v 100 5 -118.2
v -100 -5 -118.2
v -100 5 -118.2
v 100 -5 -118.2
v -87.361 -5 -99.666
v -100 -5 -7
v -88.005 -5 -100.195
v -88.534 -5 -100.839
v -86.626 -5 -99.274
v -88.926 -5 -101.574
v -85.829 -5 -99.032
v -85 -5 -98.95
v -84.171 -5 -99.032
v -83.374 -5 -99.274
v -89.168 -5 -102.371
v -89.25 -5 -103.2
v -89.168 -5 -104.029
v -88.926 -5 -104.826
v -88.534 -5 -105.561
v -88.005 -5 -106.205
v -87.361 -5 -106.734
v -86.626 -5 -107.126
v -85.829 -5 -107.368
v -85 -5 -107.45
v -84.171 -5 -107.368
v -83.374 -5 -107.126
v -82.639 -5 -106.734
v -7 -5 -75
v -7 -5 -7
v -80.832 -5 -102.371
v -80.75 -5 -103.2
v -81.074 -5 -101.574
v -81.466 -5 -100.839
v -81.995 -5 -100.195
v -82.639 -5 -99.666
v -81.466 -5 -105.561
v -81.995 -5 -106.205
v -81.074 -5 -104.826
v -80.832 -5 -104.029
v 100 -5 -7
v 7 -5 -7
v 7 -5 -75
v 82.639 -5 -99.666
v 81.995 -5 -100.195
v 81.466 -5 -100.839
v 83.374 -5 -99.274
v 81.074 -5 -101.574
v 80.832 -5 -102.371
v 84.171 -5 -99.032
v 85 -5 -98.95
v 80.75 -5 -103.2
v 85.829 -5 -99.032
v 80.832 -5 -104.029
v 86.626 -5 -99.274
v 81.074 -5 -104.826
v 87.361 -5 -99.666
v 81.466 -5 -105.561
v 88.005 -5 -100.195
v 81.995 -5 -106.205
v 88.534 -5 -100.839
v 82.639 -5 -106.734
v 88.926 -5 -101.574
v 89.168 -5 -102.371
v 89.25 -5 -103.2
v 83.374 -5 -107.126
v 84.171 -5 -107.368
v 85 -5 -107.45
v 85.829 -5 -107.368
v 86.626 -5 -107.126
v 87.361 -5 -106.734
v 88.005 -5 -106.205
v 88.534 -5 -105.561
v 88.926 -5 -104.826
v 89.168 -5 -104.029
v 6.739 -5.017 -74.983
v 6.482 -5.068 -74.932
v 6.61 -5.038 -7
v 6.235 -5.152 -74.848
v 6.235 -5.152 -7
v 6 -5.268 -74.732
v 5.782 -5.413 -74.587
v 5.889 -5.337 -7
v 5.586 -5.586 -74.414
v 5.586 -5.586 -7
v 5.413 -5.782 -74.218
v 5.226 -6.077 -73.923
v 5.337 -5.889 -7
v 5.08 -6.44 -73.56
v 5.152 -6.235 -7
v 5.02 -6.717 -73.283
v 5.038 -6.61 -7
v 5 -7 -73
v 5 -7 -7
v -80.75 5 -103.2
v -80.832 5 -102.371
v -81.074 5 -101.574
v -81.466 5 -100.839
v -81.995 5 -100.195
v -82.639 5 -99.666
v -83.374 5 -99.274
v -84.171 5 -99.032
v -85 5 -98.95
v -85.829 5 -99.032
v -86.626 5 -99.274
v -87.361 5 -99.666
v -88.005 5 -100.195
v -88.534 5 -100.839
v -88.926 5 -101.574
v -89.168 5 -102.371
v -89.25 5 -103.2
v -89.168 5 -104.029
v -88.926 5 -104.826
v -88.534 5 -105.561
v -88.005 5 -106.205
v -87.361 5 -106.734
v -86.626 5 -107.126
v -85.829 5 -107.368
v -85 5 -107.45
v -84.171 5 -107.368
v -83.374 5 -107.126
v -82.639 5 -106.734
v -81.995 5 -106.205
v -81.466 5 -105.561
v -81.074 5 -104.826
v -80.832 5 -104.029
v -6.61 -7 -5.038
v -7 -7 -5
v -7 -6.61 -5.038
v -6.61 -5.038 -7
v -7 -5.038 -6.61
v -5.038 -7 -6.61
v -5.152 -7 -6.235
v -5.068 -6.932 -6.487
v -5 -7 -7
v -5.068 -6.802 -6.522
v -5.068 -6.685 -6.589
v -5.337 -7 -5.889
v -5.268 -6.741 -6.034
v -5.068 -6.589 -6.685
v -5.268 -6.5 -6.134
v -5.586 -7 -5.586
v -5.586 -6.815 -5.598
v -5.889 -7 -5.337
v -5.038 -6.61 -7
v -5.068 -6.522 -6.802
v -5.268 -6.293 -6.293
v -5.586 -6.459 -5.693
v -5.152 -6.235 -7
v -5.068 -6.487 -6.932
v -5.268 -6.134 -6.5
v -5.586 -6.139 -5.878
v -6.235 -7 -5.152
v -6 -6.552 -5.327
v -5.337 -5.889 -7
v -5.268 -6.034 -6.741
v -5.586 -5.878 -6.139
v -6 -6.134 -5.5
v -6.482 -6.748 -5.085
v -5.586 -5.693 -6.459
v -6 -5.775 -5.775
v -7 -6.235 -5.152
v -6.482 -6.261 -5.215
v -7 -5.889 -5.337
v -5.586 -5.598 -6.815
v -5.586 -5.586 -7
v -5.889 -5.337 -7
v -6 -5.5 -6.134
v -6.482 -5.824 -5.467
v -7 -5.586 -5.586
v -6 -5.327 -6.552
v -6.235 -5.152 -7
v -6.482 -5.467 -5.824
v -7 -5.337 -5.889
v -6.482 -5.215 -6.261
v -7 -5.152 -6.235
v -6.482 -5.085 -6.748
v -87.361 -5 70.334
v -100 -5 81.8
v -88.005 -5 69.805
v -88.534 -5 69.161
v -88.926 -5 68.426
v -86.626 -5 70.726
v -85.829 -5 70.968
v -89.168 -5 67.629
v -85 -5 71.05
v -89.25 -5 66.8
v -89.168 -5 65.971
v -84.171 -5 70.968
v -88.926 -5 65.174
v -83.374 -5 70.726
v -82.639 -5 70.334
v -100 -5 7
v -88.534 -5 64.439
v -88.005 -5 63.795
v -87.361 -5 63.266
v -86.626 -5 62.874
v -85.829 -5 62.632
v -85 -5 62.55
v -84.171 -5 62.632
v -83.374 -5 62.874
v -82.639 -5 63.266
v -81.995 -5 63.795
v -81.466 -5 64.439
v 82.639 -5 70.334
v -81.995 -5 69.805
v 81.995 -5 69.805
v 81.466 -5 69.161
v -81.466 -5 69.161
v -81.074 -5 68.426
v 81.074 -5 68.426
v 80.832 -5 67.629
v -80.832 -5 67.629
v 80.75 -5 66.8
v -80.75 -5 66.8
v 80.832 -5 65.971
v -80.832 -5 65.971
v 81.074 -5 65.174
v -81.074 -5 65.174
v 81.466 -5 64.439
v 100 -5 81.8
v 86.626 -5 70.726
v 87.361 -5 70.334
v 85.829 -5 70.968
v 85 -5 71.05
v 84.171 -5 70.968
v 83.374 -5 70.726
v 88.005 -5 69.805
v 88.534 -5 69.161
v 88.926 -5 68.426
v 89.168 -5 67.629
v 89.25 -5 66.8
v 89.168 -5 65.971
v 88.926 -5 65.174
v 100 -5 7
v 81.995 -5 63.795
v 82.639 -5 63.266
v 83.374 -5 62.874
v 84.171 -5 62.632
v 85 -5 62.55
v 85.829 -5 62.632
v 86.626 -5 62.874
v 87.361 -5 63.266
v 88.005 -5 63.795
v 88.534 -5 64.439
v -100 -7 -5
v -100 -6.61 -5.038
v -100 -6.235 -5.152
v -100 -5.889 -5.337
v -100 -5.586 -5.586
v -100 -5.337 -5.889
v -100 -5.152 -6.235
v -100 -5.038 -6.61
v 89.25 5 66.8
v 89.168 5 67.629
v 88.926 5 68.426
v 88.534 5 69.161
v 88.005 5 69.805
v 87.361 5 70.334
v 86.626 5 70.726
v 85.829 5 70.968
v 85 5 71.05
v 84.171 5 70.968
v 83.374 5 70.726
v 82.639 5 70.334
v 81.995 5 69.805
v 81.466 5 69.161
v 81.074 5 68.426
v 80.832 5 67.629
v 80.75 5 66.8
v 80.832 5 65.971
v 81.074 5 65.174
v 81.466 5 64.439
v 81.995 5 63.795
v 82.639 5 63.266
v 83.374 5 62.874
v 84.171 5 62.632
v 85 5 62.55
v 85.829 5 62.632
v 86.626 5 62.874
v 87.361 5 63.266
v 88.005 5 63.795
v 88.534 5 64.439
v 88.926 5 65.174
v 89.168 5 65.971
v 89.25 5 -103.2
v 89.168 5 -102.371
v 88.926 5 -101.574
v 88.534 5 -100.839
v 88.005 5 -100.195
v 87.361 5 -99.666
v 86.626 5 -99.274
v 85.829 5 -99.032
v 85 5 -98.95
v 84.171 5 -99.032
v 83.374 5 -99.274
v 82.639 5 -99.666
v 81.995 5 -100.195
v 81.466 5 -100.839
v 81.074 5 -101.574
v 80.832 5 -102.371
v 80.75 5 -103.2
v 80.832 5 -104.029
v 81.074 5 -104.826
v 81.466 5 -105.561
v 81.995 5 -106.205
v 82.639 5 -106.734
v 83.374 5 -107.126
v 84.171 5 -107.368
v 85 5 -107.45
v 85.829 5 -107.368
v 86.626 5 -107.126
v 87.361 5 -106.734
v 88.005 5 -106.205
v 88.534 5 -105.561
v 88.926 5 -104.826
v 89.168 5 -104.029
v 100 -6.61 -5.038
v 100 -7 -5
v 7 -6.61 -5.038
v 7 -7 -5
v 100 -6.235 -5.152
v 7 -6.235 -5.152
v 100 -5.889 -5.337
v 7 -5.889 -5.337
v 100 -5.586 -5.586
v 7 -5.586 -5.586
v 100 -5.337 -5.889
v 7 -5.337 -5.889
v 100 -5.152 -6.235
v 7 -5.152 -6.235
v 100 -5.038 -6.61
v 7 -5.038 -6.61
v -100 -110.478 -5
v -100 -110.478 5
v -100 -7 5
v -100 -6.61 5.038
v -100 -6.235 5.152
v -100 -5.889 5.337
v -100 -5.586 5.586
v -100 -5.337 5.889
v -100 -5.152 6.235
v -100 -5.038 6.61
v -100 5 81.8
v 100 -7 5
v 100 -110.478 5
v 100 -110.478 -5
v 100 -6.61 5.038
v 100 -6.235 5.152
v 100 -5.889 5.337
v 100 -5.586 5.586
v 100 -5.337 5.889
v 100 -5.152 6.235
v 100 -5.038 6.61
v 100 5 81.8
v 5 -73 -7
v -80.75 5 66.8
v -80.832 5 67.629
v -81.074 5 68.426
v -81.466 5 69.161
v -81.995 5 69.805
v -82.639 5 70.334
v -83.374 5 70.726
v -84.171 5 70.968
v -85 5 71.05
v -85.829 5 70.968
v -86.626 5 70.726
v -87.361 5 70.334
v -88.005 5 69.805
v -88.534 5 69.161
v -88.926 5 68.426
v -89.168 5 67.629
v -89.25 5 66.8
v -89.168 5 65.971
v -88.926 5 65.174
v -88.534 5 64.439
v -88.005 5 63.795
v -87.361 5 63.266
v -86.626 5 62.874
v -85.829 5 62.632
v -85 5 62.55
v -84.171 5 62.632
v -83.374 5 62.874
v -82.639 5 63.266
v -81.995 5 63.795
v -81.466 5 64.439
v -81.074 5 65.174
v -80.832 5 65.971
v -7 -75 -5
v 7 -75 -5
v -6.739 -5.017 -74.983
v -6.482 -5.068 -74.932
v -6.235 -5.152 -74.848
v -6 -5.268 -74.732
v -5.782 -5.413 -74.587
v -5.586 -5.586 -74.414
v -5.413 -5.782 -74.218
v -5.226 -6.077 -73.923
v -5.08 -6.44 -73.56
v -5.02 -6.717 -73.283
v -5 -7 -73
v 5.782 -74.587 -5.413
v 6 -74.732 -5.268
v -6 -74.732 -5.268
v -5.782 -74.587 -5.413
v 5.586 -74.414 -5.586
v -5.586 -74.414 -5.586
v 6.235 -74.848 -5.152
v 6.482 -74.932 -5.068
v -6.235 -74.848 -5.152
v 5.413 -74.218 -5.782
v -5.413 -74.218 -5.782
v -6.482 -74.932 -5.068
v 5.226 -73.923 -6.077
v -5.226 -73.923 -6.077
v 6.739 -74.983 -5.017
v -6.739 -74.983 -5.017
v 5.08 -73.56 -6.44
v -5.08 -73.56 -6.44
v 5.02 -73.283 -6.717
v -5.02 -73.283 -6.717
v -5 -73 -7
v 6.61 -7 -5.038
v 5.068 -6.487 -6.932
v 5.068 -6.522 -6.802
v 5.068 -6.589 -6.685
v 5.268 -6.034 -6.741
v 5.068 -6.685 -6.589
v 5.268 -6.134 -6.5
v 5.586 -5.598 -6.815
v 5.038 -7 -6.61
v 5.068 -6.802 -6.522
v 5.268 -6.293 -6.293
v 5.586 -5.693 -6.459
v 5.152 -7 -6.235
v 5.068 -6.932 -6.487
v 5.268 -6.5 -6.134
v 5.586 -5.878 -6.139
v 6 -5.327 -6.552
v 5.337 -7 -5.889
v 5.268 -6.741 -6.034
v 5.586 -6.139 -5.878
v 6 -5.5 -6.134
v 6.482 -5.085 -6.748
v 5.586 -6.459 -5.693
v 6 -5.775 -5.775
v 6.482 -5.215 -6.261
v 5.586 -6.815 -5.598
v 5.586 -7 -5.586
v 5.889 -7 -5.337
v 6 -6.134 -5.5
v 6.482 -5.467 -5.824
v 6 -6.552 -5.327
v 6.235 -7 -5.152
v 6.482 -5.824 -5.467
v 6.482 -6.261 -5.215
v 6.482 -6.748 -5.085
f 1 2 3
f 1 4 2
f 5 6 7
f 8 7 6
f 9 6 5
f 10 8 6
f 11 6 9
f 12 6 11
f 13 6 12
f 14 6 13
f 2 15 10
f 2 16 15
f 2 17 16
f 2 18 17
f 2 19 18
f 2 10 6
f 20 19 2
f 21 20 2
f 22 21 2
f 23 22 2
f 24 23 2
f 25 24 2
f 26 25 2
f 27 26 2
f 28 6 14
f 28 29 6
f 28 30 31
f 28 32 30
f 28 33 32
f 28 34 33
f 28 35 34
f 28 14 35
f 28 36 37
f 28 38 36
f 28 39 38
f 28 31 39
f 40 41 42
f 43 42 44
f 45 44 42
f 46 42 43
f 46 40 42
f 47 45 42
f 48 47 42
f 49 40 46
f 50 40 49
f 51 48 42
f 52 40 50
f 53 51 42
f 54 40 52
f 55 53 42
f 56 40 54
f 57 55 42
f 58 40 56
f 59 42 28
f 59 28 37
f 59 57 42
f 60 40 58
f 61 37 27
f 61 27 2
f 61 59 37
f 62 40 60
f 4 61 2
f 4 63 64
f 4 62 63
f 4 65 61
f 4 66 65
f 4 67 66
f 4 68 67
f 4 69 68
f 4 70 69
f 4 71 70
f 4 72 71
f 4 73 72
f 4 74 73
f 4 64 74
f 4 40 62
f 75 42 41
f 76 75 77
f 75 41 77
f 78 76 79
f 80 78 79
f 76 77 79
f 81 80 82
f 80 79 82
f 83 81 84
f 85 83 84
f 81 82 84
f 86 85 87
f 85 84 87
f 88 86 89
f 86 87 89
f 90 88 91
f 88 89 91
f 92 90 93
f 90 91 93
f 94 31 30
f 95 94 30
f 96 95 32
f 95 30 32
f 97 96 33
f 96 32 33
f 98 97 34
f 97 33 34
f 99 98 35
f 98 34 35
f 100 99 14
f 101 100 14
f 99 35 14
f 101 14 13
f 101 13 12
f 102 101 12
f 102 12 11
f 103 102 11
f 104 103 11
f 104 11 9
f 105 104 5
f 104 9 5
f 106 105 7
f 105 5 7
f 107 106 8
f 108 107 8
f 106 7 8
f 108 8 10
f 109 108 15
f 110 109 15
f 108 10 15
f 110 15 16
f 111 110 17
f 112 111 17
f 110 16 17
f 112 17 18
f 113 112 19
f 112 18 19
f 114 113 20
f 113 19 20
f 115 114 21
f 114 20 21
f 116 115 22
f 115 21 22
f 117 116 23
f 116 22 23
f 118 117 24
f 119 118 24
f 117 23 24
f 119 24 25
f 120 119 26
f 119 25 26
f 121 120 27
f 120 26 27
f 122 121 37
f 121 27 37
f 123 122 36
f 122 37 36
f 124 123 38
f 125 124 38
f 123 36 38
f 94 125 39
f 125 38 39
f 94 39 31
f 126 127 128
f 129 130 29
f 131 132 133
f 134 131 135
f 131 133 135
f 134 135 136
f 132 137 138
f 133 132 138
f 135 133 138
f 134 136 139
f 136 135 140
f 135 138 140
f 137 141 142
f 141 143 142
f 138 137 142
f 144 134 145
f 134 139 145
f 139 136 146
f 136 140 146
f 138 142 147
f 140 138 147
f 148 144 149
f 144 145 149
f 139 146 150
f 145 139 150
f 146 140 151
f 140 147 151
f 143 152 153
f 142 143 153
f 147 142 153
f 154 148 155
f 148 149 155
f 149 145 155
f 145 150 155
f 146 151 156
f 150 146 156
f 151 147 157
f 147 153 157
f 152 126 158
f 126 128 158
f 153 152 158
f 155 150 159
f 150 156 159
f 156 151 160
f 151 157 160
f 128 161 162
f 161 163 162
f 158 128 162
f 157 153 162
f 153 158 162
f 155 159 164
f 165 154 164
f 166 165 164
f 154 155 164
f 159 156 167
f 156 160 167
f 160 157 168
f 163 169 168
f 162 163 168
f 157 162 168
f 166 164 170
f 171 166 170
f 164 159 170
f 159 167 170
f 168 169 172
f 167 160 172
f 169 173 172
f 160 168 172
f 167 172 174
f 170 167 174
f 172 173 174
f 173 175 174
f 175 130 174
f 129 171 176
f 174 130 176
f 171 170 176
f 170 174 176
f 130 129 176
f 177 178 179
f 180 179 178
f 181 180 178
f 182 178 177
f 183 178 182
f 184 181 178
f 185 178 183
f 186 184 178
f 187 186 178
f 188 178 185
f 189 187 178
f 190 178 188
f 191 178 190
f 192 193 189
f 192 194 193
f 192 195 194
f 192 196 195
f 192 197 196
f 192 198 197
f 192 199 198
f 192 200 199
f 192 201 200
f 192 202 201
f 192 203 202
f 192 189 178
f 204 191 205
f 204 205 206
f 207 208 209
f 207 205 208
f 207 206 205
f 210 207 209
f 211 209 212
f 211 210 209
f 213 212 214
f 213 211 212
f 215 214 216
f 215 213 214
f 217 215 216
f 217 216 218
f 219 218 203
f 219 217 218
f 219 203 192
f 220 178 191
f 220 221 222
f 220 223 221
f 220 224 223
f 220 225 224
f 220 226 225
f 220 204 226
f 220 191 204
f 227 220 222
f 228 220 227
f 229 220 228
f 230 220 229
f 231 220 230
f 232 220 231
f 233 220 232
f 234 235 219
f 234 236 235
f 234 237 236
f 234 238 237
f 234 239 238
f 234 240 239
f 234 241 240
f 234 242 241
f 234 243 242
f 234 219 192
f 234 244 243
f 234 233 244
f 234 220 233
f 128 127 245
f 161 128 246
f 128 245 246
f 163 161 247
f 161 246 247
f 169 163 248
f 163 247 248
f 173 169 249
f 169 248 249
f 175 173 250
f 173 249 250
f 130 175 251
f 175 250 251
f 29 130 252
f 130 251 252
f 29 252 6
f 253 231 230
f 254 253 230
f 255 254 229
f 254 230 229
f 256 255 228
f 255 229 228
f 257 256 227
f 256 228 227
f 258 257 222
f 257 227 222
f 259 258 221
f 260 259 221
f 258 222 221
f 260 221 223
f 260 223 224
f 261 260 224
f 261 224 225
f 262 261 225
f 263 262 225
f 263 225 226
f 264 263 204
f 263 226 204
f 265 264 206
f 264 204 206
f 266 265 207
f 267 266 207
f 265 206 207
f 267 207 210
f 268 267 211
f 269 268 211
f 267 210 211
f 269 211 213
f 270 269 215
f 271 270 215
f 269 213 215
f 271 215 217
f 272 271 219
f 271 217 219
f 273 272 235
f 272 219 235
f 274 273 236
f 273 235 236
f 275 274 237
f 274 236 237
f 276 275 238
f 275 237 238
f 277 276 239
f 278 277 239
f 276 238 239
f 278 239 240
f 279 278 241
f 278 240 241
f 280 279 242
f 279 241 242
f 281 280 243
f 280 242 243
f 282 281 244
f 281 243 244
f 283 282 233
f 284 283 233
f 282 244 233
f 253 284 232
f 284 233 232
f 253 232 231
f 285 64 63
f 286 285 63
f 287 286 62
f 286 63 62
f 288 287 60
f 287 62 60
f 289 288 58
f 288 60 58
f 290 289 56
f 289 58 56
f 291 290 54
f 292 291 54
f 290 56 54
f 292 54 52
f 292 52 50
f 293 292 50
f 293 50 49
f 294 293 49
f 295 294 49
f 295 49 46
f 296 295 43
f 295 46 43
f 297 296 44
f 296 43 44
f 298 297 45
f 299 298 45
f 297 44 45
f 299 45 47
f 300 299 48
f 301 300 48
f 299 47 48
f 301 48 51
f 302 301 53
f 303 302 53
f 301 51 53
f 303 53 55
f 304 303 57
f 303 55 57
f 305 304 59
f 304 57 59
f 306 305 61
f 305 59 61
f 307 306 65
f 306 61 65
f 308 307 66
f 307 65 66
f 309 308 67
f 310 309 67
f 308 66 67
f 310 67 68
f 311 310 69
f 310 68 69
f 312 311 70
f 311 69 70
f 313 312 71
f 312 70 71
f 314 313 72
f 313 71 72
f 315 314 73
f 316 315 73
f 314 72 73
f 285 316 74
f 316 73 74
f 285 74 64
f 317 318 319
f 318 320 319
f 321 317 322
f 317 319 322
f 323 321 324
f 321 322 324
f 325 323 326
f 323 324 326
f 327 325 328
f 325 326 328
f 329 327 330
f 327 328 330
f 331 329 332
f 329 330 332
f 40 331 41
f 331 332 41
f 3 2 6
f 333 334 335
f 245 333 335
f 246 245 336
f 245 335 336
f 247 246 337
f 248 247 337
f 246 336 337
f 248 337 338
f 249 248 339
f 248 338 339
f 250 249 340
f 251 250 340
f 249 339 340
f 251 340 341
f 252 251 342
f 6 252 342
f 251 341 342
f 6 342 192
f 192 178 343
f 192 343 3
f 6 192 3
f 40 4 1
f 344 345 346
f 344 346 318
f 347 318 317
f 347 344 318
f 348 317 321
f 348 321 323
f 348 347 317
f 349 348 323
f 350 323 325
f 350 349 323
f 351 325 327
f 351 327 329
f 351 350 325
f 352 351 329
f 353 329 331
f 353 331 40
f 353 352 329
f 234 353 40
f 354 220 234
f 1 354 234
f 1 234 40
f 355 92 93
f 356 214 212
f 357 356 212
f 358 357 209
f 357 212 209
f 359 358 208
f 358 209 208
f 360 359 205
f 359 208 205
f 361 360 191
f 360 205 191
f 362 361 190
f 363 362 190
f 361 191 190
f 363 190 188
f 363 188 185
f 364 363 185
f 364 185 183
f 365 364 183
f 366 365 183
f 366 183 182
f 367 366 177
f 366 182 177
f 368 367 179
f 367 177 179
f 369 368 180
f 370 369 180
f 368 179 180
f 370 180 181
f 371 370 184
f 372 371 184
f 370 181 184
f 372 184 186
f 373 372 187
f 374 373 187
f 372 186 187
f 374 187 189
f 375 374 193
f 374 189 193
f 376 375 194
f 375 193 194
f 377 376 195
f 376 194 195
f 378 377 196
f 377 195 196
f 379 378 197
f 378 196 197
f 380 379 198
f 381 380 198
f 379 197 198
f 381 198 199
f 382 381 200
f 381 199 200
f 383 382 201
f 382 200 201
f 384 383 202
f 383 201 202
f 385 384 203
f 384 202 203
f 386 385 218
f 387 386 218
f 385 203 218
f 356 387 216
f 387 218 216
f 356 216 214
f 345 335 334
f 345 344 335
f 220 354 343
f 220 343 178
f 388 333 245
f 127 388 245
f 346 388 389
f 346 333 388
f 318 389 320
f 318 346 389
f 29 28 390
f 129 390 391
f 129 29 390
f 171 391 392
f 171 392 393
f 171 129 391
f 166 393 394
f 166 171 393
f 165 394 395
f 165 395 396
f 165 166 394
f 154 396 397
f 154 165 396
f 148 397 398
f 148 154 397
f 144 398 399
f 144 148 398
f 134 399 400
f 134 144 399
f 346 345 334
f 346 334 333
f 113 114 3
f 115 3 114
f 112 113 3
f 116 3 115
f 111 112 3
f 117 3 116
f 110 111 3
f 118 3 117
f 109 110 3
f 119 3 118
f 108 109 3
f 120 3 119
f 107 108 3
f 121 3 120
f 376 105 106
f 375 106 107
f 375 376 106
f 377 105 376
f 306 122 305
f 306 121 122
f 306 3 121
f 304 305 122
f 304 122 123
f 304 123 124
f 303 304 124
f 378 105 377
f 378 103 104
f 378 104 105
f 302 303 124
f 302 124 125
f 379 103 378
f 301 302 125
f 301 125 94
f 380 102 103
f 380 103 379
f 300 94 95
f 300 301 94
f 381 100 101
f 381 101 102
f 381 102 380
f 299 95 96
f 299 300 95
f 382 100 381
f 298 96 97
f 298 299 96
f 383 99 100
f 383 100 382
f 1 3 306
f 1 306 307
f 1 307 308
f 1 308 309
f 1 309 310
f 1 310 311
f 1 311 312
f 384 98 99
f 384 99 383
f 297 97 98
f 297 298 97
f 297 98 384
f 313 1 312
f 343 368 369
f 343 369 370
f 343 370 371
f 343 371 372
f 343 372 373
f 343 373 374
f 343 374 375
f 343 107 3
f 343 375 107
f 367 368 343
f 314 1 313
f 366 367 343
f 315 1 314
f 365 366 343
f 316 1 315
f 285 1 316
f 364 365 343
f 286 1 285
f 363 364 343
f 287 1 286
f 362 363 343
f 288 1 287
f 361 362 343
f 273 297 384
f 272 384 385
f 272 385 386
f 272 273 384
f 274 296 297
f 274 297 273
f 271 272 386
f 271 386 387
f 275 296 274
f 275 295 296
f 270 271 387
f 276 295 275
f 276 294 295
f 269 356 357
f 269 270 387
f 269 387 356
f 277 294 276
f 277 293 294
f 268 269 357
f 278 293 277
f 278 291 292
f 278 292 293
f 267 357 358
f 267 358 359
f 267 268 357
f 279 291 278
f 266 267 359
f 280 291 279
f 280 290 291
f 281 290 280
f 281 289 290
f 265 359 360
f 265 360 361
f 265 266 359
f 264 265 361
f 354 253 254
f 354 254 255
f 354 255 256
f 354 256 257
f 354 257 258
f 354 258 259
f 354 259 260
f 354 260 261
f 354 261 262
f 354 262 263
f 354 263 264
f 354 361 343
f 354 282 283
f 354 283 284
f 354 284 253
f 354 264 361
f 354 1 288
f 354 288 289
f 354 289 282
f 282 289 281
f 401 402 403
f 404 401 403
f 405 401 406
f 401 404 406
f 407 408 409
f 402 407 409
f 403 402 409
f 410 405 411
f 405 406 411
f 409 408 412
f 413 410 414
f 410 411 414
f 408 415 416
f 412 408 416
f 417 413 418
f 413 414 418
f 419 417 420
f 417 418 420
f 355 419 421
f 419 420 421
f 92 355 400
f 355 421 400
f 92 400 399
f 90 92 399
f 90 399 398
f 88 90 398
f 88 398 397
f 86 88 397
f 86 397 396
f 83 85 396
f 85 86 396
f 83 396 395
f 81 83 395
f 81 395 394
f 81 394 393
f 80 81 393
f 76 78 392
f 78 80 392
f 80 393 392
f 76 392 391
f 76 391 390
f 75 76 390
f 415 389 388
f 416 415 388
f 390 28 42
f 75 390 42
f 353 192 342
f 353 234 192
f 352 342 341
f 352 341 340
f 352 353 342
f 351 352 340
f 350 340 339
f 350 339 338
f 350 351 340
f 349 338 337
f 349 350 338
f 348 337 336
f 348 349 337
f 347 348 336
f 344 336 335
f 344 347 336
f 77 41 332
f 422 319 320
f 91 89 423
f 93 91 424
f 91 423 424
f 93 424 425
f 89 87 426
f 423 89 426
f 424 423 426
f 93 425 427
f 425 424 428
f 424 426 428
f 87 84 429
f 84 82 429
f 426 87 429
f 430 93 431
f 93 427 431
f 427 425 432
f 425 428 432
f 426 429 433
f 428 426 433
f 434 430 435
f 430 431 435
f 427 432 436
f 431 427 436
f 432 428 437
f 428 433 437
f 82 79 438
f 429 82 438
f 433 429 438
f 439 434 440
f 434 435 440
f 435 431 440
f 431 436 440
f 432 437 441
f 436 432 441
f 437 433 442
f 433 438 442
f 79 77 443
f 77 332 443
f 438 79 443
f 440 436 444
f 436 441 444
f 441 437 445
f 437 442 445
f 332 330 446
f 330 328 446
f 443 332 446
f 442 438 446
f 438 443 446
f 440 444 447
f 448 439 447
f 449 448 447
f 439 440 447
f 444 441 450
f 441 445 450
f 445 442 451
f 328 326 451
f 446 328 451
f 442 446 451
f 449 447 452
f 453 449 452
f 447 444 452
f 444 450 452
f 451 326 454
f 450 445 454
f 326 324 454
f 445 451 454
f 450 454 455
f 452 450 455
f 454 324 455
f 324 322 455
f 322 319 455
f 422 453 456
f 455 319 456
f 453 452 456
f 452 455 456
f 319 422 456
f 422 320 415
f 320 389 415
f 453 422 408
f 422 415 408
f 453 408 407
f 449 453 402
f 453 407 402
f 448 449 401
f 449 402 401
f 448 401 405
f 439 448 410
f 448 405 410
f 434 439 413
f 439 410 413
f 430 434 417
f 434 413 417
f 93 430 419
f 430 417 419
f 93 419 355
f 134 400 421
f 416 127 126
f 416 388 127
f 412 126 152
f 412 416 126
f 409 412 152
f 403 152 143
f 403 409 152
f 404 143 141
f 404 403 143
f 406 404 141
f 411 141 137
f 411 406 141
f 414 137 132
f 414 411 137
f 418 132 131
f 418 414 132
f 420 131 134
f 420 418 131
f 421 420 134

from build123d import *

# Parameters (mm, degrees)
F1_DEPTH = 100
F2_W     = 10
F2_H     = 70
F3_DEPTH = 70
F5_DEPTH = 10
F6_R     = 4.25
F7_DEPTH = 10
F8_R     = 4.25
F9_DEPTH = 10
F10_R    = 2


with BuildPart() as f1:
    # F0 (on Right) → F1 (new body, symmetric)
    with BuildSketch(Plane.YZ):
        Polygon((5, -118.2), (5, 81.8), (-5, 81.8), (-5, 5), (-110.4780795566, 5), (-110.4780795566, -5), (-5, -5), (-5, -118.2), align=None)
    extrude(amount=F1_DEPTH, both=True)

    # F2 (on face) → F3 (join)
    with BuildSketch(Plane.XZ.offset(5)):
        with Locations((0, -40)):
            Rectangle(F2_W, F2_H)
    extrude(amount=F3_DEPTH)

    # F4 (on face) → F5 (cut)
    with BuildSketch(Plane(origin=(-5, 0, 0), x_dir=(0, -1, 0), z_dir=(-1, 0, 0))):
        Polygon((75, -75), (75, -5), (5, -75), align=None)
    extrude(amount=-F5_DEPTH, mode=Mode.SUBTRACT)

    # F6 (on face) → F7 (cut)
    with BuildSketch(Plane.XZ.offset(5)):
        with Locations((85, -103.2)):
            Circle(F6_R)
        with Locations((-85, -103.2)):
            Circle(F6_R)
    extrude(amount=-F7_DEPTH, mode=Mode.SUBTRACT)

    # F8 (on face) → F9 (cut)
    with BuildSketch(Plane.XZ.offset(5)):
        with Locations((-85, 66.8)):
            Circle(F8_R)
        with Locations((85, 66.8)):
            Circle(F8_R)
    extrude(amount=-F9_DEPTH, mode=Mode.SUBTRACT)

    # F10
    f10_edges = [f1.edges().sort_by_distance(p)[0] for p in [
        (-52.5, -5, -5),
        (52.5, -5, -5),
        (-5, -40, -5),
        (-5, -5, -40),
        (5, -5, -40),
        (5, -40, -5),
        (0, -5, 5),
    ]]
    fillet(f10_edges, radius=F10_R)


solid = f1.part
